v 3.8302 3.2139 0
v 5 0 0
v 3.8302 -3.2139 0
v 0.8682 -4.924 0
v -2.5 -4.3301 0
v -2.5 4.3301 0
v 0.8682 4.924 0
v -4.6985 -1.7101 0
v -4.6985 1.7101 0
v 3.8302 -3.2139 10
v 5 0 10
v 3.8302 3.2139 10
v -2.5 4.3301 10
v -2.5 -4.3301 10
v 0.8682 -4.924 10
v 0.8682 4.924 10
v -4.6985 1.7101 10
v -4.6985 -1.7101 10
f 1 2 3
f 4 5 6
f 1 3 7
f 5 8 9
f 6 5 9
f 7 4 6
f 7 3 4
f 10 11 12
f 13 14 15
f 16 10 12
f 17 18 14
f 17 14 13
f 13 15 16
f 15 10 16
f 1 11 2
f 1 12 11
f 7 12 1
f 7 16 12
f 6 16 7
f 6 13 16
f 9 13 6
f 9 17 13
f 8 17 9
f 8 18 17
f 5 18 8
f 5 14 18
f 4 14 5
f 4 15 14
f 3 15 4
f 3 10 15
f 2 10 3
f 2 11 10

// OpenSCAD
linear_extrude(height=10, slices=1) {
    circle(5, $fn = 9);
}
